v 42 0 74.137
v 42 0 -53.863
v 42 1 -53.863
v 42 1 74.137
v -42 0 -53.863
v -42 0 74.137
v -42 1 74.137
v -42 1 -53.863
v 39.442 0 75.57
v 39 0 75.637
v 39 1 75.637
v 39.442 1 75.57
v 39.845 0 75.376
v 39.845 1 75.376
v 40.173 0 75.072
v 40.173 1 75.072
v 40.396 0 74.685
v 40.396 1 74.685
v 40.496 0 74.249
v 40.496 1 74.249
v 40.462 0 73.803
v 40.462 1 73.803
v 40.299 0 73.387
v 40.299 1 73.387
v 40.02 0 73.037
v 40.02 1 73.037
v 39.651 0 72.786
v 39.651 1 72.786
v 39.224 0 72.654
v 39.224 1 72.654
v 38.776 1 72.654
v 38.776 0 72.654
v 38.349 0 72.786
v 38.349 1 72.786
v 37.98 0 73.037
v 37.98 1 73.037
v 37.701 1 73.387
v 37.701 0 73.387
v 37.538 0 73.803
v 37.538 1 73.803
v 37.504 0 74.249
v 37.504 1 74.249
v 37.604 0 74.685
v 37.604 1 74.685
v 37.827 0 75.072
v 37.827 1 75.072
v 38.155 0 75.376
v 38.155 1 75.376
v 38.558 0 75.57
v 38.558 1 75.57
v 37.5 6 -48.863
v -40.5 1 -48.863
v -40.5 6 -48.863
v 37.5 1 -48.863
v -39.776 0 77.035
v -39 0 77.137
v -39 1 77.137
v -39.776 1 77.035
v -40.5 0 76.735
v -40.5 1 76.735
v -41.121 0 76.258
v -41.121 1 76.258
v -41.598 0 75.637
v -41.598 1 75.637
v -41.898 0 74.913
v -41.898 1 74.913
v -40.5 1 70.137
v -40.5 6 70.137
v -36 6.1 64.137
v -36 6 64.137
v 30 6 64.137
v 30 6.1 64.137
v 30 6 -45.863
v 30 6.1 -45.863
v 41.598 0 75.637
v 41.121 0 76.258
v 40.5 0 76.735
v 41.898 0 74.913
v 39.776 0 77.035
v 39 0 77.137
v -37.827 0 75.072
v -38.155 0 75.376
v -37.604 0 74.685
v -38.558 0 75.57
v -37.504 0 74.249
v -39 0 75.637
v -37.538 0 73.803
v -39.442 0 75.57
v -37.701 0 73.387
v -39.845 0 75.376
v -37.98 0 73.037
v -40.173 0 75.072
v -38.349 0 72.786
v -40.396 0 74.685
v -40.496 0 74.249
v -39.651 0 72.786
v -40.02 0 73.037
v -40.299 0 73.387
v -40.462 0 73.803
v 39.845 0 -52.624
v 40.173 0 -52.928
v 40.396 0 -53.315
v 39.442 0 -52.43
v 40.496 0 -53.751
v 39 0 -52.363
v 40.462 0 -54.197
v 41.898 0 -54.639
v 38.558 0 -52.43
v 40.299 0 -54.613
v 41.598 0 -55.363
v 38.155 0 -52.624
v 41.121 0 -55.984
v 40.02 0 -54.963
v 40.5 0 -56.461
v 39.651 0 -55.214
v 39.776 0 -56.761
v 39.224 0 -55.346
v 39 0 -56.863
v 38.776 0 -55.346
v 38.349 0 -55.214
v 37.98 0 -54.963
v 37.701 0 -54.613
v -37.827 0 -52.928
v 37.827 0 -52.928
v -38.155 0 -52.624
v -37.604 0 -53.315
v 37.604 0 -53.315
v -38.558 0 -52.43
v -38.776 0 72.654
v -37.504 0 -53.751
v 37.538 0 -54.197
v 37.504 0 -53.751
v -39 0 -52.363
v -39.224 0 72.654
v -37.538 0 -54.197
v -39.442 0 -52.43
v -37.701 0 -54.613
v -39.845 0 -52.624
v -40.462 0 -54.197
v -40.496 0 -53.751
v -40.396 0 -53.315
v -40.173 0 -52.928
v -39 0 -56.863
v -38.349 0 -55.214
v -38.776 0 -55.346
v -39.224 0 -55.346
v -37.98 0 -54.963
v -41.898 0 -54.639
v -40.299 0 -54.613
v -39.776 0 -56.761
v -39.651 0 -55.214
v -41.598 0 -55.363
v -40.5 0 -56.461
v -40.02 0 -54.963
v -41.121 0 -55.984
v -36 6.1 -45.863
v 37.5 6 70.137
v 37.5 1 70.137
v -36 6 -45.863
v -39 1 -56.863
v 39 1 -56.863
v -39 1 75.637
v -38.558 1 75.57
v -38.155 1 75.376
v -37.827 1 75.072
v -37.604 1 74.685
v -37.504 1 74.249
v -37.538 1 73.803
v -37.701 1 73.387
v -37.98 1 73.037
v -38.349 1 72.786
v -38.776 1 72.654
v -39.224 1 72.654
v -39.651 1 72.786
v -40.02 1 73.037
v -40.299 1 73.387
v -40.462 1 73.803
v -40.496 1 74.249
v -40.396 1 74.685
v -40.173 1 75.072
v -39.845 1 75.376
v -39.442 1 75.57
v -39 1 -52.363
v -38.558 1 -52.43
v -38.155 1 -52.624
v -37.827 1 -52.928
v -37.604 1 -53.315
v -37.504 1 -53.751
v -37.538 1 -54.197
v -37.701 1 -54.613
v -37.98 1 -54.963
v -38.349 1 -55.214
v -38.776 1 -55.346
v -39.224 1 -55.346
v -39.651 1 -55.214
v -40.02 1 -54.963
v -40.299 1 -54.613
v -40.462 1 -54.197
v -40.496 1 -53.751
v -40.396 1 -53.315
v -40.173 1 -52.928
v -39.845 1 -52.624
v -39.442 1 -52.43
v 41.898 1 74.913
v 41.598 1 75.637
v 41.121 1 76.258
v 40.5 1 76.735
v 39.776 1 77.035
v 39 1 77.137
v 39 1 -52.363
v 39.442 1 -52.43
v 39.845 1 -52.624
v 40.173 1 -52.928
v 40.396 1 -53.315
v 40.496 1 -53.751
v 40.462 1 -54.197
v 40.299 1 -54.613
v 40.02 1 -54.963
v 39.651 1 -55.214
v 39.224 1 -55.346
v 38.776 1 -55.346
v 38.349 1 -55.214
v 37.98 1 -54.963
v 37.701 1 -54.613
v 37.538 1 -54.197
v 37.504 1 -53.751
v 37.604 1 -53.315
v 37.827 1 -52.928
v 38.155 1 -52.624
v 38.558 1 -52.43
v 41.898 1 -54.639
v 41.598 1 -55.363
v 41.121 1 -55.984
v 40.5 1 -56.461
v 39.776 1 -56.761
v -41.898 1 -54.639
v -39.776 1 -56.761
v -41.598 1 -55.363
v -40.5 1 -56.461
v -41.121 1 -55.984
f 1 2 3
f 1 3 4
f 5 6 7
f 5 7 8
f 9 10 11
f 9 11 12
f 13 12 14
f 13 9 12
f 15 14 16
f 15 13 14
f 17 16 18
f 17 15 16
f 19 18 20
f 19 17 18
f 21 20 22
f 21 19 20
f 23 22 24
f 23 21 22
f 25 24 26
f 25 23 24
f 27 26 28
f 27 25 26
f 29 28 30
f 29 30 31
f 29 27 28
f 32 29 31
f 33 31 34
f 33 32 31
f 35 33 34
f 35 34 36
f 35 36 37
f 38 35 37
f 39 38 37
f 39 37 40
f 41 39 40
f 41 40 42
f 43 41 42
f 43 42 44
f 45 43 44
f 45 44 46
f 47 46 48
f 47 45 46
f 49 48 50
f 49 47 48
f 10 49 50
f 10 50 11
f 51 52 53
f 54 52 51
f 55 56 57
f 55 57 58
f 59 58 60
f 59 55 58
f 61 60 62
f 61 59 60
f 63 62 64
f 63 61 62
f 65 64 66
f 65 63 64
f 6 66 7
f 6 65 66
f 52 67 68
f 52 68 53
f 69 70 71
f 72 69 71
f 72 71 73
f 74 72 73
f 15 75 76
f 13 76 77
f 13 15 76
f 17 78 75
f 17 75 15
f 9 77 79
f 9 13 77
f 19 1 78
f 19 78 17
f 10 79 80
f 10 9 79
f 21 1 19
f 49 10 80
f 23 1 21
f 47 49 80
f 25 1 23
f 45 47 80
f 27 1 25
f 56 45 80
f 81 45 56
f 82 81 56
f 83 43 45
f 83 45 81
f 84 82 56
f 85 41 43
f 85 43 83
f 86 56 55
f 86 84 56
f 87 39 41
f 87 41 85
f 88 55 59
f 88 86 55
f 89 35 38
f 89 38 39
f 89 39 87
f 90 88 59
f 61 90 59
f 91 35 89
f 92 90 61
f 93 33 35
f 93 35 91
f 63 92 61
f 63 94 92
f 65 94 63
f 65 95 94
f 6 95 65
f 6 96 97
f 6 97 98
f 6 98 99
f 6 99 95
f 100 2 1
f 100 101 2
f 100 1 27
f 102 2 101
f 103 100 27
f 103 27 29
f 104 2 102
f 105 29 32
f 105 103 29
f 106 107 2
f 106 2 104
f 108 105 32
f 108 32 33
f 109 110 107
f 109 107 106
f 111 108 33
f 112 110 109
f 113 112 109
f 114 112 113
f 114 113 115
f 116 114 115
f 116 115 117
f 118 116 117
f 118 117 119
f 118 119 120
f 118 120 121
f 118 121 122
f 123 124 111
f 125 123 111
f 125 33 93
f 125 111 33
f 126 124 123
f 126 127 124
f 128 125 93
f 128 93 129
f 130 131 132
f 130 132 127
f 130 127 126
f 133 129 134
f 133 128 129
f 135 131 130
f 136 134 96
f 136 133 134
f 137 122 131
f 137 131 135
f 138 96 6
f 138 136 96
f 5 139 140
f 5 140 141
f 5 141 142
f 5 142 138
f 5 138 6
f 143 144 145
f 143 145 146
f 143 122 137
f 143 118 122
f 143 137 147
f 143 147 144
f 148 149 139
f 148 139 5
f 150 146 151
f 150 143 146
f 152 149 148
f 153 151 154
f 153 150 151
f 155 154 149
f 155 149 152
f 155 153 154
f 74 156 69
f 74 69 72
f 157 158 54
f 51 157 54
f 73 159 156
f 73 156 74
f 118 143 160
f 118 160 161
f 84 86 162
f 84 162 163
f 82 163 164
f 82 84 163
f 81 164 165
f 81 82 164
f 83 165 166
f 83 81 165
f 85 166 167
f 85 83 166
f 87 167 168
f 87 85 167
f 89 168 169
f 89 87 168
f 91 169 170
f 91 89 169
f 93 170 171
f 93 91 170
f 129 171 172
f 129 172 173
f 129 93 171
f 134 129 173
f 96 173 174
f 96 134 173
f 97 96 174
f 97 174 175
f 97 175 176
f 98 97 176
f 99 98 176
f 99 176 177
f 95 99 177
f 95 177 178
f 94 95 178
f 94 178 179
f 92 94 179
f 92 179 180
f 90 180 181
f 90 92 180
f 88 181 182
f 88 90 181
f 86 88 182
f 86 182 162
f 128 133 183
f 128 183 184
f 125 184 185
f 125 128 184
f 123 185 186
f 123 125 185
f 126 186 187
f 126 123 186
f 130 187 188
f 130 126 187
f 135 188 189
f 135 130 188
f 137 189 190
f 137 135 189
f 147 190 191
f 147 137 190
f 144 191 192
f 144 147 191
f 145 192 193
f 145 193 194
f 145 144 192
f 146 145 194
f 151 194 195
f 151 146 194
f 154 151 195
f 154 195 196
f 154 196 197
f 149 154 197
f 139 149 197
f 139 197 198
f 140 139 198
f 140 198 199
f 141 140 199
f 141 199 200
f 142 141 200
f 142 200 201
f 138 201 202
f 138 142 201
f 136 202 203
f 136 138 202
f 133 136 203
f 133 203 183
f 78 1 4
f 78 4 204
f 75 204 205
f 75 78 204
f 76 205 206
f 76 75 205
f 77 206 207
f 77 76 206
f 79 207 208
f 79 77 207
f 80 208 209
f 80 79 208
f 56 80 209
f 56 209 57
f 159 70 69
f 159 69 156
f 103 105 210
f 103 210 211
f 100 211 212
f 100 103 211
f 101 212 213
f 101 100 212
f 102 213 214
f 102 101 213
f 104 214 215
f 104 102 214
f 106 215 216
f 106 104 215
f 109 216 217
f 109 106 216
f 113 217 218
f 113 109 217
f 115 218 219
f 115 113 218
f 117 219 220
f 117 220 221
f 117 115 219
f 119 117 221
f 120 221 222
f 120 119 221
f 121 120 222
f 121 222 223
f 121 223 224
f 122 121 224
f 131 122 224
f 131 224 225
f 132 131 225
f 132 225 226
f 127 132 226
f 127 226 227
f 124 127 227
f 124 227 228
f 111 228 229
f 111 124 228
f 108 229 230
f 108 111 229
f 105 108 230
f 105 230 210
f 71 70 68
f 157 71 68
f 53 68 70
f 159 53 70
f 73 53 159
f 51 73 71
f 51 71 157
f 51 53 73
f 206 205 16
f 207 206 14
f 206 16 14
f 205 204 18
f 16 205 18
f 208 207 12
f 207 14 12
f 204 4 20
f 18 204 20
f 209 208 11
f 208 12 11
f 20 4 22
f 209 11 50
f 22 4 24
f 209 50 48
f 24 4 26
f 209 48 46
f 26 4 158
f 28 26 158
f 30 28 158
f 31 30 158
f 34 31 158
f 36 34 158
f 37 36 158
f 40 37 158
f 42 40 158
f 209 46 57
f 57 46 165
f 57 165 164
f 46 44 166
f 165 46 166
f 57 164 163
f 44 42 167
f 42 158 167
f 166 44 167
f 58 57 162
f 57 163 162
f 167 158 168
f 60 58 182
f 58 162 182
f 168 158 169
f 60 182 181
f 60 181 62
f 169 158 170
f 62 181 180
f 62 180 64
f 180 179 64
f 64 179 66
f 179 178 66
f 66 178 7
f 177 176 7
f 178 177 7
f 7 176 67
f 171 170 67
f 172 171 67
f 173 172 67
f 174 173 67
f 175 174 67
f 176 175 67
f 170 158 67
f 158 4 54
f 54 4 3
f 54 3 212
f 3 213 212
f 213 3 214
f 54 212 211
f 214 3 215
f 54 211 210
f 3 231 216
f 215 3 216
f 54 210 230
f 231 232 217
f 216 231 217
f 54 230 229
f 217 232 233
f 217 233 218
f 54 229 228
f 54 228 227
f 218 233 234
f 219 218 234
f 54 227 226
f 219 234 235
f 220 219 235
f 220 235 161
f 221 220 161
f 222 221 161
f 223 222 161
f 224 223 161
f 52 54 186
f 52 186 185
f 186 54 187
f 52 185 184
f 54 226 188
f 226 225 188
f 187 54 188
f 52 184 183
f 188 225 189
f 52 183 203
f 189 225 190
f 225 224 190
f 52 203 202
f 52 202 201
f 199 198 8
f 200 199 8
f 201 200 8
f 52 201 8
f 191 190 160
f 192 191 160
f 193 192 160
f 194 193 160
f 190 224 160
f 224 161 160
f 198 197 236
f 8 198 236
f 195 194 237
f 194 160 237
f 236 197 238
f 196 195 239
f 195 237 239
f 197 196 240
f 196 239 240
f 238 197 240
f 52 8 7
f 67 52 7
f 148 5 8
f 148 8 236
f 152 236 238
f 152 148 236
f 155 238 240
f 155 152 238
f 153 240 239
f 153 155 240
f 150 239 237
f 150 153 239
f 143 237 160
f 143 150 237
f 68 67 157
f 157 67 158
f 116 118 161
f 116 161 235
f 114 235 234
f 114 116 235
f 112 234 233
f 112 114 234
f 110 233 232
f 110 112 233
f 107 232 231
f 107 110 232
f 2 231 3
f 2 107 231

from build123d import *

# Parameters (mm, degrees)
SKETCH1_W           = 78
SKETCH1_H           = 119
BOSS_EXTRUDE1_DEPTH = 6
SKETCH1_3_R         = 1.5
SKETCH1_3_W         = 78
SKETCH1_3_H         = 119
BOSS_EXTRUDE2_DEPTH = 1
SKETCH2_W           = 66
SKETCH2_H           = 110
BOSS_EXTRUDE3_DEPTH = 0.1


with BuildPart() as part:
    # Sketch1 → Boss-Extrude1 (new body)
    with BuildSketch(Plane(origin=(0, 0, 0), x_dir=(1, 0, 0), z_dir=(0, 1, 0))):
        with Locations((-1.5, -10.636986301)):
            Rectangle(SKETCH1_W, SKETCH1_H)
    extrude(amount=BOSS_EXTRUDE1_DEPTH)

    # Sketch1<3> → Boss-Extrude2 (add)
    with BuildSketch(Plane(origin=(0, 0, 0), x_dir=(1, 0, 0), z_dir=(0, 1, 0))):
        with BuildLine():
            Line((-39, 56.863013699), (39, 56.863013699))
            ThreePointArc((39, 56.863013699), (41.121320344, 55.984334042), (42, 53.863013699))
            Line((42, 53.863013699), (42, -74.136986301))
            ThreePointArc((42, -74.136986301), (41.121320344, -76.258306645), (39, -77.136986301))
            Line((39, -77.136986301), (-39, -77.136986301))
            ThreePointArc((-39, -77.136986301), (-41.121320344, -76.258306645), (-42, -74.136986301))
            Line((-42, -74.136986301), (-42, 53.863013699))
            ThreePointArc((-42, 53.863013699), (-41.121320344, 55.984334042), (-39, 56.863013699))
        make_face()
        with Locations((-39, 53.863013699)):
            Circle(SKETCH1_3_R, mode=Mode.SUBTRACT)
        with Locations((39, 53.863013699)):
            Circle(SKETCH1_3_R, mode=Mode.SUBTRACT)
        with Locations((-39, -74.136986301)):
            Circle(SKETCH1_3_R, mode=Mode.SUBTRACT)
        with Locations((39, -74.136986301)):
            Circle(SKETCH1_3_R, mode=Mode.SUBTRACT)
        with Locations((-1.5, -10.636986301)):
            Rectangle(SKETCH1_3_W, SKETCH1_3_H, mode=Mode.SUBTRACT)
    extrude(amount=BOSS_EXTRUDE2_DEPTH)

    # Sketch2 → Boss-Extrude3 (add)
    with BuildSketch(Plane(origin=(0, 6, 0), x_dir=(1, 0, 0), z_dir=(0, 1, 0))):
        with Locations((-3, -9.136986301)):
            Rectangle(SKETCH2_W, SKETCH2_H)
    extrude(amount=BOSS_EXTRUDE3_DEPTH)


solid = part.part
